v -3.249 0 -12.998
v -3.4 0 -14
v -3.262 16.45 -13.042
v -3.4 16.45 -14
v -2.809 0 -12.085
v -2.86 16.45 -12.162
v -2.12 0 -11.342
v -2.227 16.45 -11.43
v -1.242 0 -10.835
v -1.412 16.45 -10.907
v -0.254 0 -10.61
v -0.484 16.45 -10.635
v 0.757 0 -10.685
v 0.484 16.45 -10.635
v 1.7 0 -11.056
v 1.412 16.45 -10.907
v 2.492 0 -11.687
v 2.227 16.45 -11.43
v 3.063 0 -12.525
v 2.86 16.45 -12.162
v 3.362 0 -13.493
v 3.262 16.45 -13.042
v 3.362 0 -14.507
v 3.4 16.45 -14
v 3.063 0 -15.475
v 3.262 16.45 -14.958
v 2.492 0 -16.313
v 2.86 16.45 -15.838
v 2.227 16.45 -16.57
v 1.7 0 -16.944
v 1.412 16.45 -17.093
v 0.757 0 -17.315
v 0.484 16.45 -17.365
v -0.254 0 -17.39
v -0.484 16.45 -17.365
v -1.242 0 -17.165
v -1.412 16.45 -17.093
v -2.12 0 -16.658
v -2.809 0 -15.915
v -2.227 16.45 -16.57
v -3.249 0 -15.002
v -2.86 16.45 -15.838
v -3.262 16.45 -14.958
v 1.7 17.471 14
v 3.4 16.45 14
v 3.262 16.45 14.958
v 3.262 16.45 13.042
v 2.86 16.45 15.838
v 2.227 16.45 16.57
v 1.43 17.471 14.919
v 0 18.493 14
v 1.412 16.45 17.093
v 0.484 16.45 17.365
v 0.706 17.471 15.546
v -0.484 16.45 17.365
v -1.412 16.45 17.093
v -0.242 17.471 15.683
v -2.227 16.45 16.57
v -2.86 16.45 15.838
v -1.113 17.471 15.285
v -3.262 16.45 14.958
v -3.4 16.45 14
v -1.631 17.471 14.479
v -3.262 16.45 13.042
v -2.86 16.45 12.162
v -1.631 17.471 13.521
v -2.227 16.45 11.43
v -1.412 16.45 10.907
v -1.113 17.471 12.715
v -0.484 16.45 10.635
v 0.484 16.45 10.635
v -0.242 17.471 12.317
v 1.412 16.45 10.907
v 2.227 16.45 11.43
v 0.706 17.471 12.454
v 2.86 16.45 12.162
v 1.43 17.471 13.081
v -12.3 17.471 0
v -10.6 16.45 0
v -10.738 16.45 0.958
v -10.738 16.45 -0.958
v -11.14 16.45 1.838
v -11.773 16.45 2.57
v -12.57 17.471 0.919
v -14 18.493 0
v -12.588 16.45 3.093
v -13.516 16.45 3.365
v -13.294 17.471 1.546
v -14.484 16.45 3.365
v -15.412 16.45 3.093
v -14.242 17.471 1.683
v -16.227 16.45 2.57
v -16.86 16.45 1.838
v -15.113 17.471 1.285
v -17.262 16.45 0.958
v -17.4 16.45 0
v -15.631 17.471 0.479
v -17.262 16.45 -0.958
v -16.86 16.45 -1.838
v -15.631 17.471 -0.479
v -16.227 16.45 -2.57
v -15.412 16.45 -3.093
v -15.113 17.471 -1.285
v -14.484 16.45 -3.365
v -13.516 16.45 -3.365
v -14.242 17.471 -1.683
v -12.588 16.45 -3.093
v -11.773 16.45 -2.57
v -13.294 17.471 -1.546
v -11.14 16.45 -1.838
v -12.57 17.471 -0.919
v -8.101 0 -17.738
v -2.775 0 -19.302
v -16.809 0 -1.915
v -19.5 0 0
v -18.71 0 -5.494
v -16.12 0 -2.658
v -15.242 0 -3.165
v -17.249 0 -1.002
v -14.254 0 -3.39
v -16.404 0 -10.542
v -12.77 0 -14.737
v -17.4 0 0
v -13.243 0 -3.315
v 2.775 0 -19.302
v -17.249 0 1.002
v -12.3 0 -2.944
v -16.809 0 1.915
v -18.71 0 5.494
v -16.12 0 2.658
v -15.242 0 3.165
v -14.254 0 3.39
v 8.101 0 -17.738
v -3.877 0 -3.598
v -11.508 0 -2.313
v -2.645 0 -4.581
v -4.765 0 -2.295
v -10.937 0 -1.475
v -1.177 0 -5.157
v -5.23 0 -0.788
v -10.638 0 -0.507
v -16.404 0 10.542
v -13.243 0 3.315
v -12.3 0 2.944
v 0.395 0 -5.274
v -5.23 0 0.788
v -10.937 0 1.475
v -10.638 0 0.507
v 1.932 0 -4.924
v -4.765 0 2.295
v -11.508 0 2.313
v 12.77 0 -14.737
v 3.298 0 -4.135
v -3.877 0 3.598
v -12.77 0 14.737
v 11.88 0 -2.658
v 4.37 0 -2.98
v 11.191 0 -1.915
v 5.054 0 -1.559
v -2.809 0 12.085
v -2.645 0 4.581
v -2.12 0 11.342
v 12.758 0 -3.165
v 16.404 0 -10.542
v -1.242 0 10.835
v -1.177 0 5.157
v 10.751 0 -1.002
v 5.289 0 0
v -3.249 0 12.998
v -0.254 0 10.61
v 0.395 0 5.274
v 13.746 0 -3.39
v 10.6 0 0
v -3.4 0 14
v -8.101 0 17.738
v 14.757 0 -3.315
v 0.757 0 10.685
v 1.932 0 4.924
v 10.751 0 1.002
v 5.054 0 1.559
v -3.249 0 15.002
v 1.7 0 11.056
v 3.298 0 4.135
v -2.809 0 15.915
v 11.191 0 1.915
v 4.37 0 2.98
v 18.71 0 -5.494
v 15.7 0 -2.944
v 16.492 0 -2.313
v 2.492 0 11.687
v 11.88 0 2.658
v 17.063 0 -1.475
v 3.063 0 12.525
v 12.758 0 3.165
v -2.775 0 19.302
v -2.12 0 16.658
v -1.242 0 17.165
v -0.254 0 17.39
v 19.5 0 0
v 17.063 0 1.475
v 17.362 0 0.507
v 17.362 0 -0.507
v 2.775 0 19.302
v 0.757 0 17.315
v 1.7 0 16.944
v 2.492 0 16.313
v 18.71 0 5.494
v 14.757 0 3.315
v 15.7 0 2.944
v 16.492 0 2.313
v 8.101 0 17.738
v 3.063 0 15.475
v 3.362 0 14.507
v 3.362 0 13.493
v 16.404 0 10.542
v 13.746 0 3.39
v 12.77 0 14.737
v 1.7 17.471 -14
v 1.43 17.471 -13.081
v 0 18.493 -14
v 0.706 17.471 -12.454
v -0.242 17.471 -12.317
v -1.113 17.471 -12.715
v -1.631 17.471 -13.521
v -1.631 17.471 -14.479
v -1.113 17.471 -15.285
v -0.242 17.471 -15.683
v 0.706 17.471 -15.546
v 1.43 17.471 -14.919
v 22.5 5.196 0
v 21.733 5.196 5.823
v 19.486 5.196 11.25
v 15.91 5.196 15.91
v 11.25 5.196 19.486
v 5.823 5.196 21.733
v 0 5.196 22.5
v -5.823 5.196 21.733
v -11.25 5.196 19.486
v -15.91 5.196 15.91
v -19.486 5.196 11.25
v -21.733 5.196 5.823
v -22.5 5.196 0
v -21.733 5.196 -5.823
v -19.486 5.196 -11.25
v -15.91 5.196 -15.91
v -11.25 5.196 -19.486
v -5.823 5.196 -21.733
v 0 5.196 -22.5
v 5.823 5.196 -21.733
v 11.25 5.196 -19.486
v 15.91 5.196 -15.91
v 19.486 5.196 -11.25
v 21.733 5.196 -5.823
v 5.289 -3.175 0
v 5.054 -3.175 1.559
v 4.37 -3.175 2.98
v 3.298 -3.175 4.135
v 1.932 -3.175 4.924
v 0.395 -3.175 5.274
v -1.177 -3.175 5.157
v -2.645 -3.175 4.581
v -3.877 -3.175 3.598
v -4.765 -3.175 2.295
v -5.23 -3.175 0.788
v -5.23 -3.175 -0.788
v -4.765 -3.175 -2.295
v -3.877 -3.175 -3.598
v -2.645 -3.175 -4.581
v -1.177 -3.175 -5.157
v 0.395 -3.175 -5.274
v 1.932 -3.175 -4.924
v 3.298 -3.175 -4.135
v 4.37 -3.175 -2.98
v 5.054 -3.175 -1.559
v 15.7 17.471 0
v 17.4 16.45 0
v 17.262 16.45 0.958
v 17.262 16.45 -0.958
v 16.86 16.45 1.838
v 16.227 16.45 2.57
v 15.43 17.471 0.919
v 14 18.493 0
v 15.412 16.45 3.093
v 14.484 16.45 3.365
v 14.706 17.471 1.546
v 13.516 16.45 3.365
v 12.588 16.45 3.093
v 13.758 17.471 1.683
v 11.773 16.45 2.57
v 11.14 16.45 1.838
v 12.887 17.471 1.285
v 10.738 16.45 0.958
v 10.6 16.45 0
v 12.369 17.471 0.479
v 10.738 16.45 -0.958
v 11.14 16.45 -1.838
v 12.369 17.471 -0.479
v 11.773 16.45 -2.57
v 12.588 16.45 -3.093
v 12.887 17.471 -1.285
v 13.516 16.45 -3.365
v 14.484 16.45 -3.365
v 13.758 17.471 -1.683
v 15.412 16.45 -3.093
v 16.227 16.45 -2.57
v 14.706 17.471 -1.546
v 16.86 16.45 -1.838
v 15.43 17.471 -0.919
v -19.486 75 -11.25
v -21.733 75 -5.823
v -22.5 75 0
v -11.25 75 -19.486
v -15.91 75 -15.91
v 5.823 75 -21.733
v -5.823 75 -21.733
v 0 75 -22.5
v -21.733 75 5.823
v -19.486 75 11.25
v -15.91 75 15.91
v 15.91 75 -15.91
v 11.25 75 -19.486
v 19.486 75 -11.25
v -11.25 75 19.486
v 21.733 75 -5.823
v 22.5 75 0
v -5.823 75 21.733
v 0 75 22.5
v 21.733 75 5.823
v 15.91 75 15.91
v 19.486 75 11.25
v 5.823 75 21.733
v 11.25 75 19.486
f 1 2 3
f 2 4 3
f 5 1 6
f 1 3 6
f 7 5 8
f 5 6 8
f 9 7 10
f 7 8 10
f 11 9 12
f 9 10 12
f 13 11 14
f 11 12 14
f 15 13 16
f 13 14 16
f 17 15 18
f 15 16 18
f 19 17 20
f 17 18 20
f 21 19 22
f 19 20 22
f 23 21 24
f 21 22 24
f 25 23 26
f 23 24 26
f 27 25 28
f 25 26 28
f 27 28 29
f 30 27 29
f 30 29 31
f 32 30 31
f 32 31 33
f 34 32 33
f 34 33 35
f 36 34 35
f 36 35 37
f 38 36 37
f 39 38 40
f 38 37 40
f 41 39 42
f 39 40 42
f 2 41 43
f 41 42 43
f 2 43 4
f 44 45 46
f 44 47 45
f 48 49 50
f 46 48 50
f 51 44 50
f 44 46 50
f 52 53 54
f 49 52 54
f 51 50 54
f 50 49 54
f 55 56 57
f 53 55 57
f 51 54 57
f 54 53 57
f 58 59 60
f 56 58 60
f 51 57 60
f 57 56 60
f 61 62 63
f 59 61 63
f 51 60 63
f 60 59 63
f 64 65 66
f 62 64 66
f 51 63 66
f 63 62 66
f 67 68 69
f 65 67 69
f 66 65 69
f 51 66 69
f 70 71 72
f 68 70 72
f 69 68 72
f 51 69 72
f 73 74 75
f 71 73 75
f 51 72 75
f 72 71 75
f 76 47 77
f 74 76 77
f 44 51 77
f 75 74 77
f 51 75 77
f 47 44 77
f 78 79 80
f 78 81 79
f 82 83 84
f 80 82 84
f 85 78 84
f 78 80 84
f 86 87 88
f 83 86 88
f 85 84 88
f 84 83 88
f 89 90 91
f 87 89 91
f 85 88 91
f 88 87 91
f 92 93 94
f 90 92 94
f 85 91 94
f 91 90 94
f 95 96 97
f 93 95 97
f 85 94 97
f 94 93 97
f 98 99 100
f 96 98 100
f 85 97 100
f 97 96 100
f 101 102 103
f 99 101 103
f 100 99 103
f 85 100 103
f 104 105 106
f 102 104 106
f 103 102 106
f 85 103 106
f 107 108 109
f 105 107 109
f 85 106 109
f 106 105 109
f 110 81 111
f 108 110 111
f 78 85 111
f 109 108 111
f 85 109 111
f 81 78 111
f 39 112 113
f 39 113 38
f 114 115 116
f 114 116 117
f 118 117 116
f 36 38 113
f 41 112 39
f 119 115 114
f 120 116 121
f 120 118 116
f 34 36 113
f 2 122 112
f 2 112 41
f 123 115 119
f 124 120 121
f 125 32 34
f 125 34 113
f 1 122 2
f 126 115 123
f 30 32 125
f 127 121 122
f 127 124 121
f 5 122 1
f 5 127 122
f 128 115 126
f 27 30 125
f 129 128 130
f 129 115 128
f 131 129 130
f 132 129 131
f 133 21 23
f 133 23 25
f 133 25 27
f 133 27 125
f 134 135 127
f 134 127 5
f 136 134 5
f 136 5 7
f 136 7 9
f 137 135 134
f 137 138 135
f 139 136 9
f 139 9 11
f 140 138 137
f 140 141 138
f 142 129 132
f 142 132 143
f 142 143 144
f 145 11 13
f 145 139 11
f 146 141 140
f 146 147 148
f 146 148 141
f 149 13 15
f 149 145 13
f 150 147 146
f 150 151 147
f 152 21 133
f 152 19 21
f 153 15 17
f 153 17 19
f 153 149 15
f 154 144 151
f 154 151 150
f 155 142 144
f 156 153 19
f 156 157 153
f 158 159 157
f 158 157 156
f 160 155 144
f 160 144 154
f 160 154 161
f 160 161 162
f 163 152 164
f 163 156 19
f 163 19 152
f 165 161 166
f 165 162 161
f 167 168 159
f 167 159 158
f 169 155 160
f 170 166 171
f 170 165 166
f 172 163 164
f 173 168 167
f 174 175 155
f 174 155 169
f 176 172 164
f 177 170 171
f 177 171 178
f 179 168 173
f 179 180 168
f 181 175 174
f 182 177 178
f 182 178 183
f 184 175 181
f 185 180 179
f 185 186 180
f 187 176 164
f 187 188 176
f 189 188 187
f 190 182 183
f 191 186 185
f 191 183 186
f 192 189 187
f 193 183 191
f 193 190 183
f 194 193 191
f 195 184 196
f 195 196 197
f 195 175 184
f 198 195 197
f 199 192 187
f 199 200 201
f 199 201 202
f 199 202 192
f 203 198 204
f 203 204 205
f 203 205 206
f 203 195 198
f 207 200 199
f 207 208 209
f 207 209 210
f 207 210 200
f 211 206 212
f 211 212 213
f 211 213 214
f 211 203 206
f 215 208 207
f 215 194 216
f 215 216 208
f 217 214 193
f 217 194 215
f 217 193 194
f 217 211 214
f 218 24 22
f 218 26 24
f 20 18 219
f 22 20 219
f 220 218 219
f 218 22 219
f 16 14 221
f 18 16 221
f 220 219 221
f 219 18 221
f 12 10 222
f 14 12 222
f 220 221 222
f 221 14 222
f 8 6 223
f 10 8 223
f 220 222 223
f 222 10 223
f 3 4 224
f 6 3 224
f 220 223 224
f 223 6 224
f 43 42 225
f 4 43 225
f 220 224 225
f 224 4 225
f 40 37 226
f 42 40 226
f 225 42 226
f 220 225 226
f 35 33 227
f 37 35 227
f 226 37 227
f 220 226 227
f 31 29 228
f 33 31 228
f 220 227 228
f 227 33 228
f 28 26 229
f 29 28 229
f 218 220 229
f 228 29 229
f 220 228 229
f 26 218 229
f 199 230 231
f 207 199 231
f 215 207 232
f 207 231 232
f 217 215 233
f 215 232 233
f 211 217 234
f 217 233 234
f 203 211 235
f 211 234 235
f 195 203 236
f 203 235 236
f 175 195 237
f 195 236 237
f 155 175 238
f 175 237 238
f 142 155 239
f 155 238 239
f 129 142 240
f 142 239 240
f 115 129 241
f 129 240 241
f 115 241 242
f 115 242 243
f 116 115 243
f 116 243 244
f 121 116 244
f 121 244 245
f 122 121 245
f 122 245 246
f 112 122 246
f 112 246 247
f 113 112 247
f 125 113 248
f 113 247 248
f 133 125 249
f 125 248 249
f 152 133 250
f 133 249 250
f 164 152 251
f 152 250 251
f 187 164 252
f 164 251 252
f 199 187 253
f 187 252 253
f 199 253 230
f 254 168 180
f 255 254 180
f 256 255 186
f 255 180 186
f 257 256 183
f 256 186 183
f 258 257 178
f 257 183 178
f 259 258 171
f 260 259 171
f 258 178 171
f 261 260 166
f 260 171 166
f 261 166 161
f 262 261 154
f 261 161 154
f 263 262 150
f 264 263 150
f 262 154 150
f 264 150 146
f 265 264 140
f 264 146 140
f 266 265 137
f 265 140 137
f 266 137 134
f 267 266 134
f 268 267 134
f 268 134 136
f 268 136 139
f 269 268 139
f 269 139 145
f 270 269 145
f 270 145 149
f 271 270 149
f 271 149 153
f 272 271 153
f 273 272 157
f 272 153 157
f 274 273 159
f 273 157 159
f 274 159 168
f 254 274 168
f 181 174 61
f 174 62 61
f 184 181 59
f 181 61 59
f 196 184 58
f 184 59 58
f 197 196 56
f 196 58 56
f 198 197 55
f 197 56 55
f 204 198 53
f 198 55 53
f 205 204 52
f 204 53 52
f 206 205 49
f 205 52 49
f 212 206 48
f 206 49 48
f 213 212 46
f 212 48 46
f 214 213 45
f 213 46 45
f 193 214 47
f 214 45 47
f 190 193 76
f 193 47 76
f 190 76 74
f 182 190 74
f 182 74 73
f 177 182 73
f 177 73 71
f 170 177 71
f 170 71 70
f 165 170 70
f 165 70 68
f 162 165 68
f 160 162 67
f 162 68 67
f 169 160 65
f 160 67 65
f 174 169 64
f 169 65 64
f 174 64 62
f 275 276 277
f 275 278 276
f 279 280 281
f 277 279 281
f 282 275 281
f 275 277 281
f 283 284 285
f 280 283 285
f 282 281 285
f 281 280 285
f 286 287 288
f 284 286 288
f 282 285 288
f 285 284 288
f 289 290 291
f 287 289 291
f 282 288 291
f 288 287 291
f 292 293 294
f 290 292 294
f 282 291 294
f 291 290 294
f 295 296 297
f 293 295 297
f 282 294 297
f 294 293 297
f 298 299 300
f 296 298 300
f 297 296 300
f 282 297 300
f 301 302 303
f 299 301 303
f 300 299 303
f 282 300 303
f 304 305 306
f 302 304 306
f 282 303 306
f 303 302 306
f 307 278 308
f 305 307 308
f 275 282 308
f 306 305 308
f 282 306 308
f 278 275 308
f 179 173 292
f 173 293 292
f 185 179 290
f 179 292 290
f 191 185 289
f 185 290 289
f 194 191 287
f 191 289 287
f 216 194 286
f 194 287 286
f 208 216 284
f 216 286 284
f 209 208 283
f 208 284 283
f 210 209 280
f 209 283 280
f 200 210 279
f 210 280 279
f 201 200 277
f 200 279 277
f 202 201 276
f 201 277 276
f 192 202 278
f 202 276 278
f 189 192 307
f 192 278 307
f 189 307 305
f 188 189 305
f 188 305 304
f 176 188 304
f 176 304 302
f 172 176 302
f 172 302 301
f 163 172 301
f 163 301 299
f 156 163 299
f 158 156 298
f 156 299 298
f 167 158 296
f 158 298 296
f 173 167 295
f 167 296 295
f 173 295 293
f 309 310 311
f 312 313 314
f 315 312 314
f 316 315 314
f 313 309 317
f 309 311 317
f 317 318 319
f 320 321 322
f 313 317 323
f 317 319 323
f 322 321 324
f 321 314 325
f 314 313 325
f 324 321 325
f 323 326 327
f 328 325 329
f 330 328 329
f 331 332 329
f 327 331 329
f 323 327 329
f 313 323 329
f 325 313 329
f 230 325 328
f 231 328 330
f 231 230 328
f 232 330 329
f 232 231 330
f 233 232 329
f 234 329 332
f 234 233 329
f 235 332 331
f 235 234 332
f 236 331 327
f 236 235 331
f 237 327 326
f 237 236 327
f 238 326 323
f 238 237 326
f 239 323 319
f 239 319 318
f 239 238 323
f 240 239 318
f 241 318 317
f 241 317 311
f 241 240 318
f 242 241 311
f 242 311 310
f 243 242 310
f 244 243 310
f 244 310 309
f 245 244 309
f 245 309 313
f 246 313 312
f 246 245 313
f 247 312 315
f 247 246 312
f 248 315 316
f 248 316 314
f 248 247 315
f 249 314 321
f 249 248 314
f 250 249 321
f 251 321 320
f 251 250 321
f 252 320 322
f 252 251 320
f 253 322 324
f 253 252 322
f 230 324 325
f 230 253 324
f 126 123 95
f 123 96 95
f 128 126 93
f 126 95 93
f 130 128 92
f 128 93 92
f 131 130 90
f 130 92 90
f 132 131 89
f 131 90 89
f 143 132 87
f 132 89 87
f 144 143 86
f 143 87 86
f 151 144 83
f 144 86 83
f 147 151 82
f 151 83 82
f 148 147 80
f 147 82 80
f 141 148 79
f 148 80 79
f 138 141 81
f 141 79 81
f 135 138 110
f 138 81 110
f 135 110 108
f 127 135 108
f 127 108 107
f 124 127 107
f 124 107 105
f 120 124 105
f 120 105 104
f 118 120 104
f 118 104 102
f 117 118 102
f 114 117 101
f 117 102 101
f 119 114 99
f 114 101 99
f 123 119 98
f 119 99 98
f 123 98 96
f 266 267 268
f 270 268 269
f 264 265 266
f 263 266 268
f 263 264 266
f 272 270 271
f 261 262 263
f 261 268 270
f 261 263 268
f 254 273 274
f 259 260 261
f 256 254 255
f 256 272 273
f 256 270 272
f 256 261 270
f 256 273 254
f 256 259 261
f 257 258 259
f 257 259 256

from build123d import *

# Parameters (mm, degrees)
F0_R     = 22.5
F1_DEPTH = 75
F3_D     = 6.8
F3_DEPTH = 16.45
F3_TIP   = 2.0429261047
F4_R     = 5.2892002913
F5_DEPTH = 3.175
F6_SIZE2 = 5.1961524227
F6_SIZE  = 3


with BuildPart() as f1:
    # F0 (on Front) → F1 (new body)
    with BuildSketch(Plane.XZ):
        Circle(F0_R)
    extrude(amount=-F1_DEPTH)

    # F3
    with Locations(Plane.XZ):
        with Locations((0, -14), (14, 0), (0, 14), (-14, 0)):
            Hole(F3_D / 2, depth=F3_DEPTH)
            with Locations((0, 0, -(F3_DEPTH + F3_TIP / 2))):  # 118° drill point
                Cone(0, F3_D / 2, F3_TIP, mode=Mode.SUBTRACT)

    # F4 (on face) → F5 (join)
    with BuildSketch(Plane.XZ):
        Circle(F4_R)
    extrude(amount=F5_DEPTH)

    # F6
    f6_edges = [f1.edges().sort_by_distance(p)[0] for p in [
        (-22.5, 0, 0),
    ]]
    f6_side = f1.faces().sort_by_distance((-21.863604, 0, 0))[0]
    chamfer(f6_edges, length=F6_SIZE, length2=F6_SIZE2, reference=f6_side)


solid = f1.part
